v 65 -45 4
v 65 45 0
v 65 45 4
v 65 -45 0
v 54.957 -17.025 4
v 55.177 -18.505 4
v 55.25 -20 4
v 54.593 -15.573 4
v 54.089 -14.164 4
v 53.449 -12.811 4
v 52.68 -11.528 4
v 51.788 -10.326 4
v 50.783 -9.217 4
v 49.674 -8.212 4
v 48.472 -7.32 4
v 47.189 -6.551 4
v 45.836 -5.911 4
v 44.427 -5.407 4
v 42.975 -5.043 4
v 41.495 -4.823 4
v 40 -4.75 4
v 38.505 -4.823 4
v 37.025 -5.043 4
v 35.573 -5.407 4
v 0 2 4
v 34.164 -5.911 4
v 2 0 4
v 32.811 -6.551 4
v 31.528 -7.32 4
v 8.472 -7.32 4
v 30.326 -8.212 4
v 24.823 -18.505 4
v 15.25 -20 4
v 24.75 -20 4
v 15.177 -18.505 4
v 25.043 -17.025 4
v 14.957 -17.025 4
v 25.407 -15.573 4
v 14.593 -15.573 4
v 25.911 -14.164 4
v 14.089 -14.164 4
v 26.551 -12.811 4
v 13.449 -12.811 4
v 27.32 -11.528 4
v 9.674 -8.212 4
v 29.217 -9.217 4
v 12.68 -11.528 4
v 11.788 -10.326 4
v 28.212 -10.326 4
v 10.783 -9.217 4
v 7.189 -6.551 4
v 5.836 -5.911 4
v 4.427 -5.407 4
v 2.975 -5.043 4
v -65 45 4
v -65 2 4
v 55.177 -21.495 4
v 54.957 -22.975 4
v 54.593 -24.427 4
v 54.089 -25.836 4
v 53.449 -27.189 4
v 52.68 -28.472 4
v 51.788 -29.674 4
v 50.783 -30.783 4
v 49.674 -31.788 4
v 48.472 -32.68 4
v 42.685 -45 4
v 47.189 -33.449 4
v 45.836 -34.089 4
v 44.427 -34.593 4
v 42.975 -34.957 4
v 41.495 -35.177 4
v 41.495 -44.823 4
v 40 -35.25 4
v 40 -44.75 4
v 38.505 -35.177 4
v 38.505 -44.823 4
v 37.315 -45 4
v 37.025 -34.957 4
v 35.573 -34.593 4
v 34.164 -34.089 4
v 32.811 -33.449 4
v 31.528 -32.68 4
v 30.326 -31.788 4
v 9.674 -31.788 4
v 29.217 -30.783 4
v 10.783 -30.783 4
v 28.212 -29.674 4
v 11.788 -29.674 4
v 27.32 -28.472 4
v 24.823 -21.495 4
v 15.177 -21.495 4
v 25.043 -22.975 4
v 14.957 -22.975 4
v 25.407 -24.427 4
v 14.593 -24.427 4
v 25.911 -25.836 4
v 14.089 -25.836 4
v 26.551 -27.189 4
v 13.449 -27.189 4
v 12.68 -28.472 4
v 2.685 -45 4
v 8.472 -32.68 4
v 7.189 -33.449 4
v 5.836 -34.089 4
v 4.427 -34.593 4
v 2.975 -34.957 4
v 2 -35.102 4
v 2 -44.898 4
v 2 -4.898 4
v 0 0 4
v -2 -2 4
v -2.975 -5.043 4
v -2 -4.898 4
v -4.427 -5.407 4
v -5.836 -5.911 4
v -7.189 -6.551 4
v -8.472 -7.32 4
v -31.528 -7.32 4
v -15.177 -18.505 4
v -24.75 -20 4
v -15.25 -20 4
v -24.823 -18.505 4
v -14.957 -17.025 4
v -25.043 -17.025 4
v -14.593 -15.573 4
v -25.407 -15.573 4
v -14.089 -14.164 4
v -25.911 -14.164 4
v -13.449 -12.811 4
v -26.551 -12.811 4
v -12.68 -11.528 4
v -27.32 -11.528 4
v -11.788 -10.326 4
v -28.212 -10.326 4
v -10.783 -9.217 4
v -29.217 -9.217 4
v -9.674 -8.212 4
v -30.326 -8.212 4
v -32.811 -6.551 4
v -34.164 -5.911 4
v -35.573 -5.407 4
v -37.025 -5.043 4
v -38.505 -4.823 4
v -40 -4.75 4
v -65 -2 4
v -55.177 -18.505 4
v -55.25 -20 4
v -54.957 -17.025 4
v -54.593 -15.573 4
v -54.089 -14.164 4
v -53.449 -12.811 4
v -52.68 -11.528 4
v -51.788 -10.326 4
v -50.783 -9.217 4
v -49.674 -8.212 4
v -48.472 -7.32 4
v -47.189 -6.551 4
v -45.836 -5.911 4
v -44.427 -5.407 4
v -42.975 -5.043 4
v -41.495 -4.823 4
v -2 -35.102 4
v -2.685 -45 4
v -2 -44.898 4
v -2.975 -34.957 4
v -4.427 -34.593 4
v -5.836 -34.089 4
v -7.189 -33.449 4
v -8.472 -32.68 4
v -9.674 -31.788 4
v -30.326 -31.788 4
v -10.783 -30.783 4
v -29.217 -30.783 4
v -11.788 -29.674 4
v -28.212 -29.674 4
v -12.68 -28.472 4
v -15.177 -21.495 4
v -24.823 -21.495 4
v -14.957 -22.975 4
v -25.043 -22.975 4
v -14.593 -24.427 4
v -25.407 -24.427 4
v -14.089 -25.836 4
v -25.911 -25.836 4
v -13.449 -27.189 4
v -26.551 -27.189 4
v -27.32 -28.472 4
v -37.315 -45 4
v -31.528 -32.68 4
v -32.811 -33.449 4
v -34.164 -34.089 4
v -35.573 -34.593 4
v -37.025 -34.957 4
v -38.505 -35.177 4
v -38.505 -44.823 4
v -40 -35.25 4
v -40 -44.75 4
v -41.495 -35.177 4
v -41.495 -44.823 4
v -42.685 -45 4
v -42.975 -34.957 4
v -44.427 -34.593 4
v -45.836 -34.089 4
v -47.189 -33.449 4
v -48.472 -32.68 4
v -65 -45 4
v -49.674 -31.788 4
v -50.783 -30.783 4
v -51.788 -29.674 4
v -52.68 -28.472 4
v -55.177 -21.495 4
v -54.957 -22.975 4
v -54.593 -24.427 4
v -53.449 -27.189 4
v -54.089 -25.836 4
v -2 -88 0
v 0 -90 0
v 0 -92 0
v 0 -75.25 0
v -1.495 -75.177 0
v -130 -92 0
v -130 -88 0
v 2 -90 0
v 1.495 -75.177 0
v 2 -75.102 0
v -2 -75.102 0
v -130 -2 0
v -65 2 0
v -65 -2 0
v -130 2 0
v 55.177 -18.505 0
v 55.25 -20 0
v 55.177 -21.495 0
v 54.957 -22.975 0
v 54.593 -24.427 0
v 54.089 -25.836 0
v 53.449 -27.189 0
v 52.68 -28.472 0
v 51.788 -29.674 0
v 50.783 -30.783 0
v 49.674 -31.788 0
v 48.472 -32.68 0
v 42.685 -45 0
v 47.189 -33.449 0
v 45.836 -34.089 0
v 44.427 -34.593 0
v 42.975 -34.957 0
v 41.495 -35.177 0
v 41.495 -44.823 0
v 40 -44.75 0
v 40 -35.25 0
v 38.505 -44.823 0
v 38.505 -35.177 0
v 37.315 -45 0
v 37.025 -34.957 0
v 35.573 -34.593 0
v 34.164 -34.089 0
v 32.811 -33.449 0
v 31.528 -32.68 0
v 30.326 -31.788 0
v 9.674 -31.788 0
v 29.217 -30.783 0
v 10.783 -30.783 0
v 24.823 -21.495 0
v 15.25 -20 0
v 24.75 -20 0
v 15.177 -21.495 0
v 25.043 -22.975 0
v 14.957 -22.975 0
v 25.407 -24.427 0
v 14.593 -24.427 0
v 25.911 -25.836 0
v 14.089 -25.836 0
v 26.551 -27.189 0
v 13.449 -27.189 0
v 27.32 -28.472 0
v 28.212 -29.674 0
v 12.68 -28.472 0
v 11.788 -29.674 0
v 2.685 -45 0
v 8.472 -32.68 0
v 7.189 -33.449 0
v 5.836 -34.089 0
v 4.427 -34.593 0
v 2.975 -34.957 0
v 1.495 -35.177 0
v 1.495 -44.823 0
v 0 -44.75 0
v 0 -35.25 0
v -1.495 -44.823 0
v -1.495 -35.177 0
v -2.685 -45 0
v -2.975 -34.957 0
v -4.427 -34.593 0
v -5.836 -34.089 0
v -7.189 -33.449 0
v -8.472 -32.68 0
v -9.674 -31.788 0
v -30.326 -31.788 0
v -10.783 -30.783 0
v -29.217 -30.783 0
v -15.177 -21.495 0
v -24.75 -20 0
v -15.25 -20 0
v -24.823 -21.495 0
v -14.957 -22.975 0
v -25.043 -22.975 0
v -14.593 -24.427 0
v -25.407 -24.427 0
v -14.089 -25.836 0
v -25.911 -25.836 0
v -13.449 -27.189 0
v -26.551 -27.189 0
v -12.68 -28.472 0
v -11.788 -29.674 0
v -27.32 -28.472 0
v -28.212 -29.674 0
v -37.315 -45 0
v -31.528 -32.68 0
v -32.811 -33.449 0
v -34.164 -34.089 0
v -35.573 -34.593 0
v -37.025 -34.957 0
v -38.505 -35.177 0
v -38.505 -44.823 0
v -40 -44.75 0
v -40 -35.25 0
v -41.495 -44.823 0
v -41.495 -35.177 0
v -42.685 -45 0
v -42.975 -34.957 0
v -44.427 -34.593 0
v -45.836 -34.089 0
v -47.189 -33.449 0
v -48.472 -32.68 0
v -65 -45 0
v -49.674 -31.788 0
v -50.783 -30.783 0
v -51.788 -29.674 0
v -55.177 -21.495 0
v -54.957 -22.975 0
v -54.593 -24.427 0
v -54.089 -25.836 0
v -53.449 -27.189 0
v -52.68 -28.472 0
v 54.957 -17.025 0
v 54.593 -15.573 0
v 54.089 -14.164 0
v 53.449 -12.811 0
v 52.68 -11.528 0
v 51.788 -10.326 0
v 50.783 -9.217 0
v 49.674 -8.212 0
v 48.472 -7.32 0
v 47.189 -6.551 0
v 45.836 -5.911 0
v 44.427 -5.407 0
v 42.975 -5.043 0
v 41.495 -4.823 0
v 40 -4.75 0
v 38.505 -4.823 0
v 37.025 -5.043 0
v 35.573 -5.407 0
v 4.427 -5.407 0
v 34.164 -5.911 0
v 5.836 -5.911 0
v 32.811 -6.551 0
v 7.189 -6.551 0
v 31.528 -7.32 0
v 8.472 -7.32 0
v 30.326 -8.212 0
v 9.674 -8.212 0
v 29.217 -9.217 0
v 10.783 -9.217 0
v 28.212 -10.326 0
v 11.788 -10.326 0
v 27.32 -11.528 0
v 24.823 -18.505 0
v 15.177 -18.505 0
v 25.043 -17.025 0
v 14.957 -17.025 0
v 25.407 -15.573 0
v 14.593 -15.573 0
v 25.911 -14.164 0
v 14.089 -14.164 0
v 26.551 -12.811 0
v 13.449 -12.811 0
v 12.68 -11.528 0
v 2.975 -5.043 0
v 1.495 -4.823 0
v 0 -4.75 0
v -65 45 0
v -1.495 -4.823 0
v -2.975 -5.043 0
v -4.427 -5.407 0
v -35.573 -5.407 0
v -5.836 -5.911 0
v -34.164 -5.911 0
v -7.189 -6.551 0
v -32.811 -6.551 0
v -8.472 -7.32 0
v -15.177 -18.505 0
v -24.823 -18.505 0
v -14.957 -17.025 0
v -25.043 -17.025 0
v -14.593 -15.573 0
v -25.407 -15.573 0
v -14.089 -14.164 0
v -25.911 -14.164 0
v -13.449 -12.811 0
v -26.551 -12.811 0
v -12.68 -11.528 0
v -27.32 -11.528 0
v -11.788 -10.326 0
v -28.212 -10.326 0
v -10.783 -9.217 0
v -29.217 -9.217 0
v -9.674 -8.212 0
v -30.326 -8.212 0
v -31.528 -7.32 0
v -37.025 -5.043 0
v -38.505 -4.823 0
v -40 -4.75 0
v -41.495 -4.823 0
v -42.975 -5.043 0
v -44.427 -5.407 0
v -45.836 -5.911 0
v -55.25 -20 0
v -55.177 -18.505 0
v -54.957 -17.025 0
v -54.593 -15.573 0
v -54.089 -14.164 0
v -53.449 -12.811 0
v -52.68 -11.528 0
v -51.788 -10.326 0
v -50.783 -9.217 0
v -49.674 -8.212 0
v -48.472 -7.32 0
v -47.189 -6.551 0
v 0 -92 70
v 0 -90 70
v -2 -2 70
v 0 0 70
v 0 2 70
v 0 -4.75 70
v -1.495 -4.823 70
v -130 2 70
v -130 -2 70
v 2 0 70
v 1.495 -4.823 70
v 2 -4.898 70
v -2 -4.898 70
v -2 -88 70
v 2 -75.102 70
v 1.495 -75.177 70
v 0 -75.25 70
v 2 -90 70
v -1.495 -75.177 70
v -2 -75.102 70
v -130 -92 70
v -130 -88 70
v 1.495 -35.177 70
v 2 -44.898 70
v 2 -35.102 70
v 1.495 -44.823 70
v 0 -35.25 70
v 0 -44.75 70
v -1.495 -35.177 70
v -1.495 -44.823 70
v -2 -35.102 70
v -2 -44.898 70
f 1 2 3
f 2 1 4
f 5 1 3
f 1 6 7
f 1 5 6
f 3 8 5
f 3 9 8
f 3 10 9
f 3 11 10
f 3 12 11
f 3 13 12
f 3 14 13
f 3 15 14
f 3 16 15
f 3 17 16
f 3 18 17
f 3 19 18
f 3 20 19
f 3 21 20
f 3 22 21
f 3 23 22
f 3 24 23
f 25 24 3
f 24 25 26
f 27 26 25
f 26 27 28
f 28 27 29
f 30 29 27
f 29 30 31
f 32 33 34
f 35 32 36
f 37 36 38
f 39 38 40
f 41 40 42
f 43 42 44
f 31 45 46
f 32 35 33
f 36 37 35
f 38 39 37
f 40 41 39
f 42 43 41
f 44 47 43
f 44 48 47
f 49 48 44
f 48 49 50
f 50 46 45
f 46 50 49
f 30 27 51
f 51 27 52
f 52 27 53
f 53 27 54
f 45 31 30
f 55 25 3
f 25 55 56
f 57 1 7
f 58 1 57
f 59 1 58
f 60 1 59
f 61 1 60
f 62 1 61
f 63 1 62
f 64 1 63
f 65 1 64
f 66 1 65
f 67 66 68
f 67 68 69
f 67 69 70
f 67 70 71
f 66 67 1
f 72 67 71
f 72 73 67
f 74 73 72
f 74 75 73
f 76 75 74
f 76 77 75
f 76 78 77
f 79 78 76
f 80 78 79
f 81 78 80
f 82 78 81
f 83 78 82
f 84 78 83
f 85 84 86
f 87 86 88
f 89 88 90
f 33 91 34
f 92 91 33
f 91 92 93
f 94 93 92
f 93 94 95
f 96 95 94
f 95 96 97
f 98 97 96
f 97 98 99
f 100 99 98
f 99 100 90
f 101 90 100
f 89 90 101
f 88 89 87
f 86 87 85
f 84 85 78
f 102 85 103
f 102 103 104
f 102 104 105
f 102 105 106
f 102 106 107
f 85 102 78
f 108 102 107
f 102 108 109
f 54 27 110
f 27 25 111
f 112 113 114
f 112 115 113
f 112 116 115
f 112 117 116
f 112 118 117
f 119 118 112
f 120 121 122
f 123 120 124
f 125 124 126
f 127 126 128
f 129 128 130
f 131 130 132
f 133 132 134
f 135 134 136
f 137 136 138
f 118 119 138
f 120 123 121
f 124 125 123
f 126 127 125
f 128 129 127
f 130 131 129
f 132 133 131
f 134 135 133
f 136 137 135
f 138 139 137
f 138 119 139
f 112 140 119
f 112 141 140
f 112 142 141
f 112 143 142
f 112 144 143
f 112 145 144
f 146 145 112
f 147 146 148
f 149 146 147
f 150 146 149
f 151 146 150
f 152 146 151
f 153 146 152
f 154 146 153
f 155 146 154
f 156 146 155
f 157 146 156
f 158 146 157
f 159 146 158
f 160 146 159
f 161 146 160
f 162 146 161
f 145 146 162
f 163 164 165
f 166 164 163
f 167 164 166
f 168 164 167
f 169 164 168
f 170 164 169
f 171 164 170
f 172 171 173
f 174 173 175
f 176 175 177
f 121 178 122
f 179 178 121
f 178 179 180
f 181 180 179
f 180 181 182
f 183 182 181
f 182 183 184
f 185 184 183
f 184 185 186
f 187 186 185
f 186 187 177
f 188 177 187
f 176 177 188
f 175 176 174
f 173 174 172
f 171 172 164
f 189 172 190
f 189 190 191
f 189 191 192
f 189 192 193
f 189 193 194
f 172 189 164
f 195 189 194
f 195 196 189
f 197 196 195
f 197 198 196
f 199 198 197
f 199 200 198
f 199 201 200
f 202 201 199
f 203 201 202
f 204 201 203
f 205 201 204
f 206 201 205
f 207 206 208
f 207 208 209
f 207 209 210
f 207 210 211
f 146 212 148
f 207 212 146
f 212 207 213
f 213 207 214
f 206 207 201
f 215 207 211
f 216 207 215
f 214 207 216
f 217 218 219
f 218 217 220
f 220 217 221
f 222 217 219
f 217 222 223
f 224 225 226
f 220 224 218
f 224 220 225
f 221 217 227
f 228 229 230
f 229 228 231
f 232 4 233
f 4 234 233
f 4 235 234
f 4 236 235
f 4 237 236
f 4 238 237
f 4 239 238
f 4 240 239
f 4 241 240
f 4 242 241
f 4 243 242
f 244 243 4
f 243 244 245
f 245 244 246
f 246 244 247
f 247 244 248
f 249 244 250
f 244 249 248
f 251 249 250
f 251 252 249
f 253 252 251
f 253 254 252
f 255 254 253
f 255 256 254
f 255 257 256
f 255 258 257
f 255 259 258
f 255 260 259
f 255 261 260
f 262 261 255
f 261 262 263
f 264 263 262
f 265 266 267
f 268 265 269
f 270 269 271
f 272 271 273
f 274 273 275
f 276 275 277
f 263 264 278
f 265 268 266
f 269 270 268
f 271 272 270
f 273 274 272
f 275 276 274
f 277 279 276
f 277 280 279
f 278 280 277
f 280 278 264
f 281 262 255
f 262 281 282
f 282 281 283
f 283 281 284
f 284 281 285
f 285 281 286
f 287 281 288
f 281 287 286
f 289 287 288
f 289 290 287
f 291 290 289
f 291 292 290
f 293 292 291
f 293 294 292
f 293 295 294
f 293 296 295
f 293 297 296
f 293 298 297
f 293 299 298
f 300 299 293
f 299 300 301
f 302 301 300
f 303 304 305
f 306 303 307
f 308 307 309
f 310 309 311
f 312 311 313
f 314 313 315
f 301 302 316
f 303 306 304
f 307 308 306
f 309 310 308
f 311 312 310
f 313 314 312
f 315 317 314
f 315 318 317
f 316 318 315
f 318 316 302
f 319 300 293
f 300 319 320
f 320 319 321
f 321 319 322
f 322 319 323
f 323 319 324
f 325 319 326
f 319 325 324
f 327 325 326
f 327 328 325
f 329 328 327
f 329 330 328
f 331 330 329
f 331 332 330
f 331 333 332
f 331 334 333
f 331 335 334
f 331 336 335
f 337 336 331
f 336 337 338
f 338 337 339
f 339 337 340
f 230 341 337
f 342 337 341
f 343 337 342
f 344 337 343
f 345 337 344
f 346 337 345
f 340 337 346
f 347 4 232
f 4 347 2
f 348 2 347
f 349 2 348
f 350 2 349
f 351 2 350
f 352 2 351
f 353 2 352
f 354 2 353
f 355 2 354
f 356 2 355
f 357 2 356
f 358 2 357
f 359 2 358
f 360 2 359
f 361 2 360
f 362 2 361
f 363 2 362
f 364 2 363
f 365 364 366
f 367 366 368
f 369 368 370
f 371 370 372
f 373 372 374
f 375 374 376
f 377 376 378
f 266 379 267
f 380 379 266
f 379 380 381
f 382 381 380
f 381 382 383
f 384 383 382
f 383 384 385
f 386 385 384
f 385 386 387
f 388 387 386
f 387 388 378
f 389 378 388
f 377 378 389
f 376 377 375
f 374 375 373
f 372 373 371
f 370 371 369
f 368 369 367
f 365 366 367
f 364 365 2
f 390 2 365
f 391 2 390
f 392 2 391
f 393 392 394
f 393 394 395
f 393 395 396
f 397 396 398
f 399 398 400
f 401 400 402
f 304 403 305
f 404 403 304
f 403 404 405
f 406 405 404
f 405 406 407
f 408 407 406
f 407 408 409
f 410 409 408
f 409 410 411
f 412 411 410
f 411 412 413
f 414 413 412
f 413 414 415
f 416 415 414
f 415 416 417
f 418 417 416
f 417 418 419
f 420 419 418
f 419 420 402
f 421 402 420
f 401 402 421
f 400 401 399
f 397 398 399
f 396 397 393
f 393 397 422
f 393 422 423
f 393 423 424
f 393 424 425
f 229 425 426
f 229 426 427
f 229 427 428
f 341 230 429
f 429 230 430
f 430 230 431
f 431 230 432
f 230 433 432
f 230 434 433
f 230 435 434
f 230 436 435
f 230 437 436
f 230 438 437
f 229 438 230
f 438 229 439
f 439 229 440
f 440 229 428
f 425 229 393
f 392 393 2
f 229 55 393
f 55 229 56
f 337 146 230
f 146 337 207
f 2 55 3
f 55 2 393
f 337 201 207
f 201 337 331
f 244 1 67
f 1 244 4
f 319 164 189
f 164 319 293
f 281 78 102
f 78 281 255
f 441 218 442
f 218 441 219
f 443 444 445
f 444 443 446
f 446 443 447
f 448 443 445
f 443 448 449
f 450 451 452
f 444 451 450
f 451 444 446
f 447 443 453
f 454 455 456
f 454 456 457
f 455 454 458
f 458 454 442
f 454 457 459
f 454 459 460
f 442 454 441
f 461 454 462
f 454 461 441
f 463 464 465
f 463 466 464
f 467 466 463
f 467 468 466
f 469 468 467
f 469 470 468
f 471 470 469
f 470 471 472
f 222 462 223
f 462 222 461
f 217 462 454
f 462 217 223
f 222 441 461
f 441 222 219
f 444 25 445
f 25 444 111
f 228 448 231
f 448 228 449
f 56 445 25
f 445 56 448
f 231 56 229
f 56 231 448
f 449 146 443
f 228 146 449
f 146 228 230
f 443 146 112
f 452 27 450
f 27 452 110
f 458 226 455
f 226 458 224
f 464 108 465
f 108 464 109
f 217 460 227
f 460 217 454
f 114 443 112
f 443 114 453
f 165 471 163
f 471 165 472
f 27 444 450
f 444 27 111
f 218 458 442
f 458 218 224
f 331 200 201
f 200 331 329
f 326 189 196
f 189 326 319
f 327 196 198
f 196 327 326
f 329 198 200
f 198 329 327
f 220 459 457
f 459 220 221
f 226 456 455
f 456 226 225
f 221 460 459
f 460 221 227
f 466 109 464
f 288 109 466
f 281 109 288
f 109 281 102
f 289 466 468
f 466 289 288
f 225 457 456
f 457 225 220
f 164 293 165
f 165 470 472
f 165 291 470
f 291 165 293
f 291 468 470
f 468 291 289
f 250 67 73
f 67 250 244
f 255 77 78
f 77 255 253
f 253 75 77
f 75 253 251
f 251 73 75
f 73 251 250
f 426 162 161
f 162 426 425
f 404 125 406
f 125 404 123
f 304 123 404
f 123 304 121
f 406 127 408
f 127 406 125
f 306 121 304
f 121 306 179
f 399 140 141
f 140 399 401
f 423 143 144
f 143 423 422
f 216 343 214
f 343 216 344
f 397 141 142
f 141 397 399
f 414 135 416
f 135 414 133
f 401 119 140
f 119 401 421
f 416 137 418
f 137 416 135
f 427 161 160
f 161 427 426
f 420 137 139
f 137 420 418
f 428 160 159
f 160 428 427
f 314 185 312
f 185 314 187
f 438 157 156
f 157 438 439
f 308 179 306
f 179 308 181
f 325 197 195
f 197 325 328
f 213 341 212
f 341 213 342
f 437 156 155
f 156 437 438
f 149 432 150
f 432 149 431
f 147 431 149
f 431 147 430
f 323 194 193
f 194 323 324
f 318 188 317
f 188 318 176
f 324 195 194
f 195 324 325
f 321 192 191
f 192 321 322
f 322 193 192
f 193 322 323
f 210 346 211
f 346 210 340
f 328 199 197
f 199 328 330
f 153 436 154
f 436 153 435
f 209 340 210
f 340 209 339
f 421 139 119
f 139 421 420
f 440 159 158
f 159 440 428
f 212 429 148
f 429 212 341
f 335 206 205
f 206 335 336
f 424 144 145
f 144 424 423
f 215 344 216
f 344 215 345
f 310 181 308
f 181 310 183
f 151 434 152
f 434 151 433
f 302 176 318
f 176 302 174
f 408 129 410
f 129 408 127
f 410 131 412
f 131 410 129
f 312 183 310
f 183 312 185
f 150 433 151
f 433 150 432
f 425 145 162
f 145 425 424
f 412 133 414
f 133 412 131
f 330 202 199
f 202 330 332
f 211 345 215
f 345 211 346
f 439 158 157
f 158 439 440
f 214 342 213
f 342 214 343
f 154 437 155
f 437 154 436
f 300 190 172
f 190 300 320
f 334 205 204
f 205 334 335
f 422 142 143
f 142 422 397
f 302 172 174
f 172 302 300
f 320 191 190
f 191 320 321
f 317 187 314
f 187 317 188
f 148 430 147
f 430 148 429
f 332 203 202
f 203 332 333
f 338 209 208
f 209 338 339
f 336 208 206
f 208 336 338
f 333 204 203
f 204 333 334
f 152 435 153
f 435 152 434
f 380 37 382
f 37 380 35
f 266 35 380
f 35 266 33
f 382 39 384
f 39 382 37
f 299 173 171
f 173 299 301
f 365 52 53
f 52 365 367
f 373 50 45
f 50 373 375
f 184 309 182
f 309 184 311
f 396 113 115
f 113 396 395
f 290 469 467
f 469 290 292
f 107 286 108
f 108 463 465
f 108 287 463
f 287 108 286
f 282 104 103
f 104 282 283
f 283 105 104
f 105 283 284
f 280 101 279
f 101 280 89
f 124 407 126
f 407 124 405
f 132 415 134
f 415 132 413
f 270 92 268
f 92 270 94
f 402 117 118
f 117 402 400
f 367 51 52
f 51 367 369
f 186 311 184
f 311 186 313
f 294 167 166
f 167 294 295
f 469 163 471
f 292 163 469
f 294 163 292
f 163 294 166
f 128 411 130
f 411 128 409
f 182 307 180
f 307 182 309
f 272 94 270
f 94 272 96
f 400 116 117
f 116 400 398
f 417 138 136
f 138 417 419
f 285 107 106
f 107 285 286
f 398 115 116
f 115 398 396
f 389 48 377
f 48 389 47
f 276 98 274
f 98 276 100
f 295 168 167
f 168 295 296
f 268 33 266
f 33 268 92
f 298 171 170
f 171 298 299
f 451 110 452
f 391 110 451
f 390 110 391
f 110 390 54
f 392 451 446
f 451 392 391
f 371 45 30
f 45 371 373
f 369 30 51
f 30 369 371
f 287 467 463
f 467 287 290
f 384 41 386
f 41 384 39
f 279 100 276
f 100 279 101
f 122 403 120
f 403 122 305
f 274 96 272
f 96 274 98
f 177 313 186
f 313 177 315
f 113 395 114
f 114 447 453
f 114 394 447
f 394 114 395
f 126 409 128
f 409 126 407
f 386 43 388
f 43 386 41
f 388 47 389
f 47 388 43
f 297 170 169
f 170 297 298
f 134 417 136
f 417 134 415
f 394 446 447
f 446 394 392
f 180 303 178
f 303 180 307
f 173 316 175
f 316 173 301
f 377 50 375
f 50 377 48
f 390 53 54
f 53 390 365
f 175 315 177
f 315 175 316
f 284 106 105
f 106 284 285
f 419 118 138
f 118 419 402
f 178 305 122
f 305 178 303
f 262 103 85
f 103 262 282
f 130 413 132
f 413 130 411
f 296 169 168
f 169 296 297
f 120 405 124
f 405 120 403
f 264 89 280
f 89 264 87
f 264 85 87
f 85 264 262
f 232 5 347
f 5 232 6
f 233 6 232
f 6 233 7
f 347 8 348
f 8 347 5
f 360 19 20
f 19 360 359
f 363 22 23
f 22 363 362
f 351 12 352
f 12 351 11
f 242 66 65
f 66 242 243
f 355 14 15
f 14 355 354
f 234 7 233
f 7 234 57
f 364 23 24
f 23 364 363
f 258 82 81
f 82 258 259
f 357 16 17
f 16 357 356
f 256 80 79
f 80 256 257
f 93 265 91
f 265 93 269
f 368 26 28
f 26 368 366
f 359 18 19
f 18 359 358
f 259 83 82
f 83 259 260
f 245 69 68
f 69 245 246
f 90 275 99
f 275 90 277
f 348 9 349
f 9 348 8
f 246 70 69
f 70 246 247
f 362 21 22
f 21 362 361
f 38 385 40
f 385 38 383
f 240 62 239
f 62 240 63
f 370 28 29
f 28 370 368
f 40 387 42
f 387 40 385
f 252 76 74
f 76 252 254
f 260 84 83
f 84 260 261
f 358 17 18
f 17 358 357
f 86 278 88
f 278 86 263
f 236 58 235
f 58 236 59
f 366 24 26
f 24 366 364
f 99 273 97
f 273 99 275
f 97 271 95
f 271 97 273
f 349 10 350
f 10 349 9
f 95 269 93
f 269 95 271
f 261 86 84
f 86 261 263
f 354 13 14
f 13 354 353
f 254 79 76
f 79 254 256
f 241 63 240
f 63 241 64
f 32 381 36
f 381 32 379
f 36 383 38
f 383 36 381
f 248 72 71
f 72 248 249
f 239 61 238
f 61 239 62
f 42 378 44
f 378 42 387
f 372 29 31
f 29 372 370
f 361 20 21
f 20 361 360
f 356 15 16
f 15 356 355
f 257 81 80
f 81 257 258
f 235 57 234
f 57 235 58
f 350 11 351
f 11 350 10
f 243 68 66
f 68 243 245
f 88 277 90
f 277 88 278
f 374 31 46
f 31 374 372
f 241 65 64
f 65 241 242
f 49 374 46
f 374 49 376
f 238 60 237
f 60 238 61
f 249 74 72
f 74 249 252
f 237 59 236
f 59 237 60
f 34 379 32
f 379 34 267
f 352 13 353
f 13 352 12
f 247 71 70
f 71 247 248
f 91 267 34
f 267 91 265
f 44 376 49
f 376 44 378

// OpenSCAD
// Built by bench/smallmodels/features/compiler.py from a list of features.
$fn = 64;
difference() {
  union() {
    translate([0, 0, 0]) translate([-65, -45, 0]) cube([130, 90, 4]);
    translate([-65, -90, 0]) rotate([0, 0, 0]) translate([-65, -2, 0]) cube([130, 4, 70]); translate([-65, 0, 0]) rotate([0, 0, 0]) translate([-65, -2, 0]) cube([130, 4, 70]);
    translate([0, -45, 0]) rotate([0, 0, 0]) translate([-2, -45, 0]) cube([4, 90, 70]); translate([0, -45, 0]) rotate([0, 0, 0]) translate([-2, -45, 0]) cube([4, 90, 70]); translate([0, -45, 0]) rotate([0, 0, 0]) translate([-2, -45, 0]) cube([4, 90, 70]);
  }
  union() {
    translate([-40, -60, -1]) rotate([0, 0, 0]) cylinder(d = 30.5, h = 72);
    translate([0, -60, -1]) rotate([0, 0, 0]) cylinder(d = 30.5, h = 72);
    translate([40, -60, -1]) rotate([0, 0, 0]) cylinder(d = 30.5, h = 72);
    translate([-40, -20, -1]) rotate([0, 0, 0]) cylinder(d = 30.5, h = 72);
    translate([0, -20, -1]) rotate([0, 0, 0]) cylinder(d = 30.5, h = 72);
    translate([40, -20, -1]) rotate([0, 0, 0]) cylinder(d = 30.5, h = 72);
  }
}
